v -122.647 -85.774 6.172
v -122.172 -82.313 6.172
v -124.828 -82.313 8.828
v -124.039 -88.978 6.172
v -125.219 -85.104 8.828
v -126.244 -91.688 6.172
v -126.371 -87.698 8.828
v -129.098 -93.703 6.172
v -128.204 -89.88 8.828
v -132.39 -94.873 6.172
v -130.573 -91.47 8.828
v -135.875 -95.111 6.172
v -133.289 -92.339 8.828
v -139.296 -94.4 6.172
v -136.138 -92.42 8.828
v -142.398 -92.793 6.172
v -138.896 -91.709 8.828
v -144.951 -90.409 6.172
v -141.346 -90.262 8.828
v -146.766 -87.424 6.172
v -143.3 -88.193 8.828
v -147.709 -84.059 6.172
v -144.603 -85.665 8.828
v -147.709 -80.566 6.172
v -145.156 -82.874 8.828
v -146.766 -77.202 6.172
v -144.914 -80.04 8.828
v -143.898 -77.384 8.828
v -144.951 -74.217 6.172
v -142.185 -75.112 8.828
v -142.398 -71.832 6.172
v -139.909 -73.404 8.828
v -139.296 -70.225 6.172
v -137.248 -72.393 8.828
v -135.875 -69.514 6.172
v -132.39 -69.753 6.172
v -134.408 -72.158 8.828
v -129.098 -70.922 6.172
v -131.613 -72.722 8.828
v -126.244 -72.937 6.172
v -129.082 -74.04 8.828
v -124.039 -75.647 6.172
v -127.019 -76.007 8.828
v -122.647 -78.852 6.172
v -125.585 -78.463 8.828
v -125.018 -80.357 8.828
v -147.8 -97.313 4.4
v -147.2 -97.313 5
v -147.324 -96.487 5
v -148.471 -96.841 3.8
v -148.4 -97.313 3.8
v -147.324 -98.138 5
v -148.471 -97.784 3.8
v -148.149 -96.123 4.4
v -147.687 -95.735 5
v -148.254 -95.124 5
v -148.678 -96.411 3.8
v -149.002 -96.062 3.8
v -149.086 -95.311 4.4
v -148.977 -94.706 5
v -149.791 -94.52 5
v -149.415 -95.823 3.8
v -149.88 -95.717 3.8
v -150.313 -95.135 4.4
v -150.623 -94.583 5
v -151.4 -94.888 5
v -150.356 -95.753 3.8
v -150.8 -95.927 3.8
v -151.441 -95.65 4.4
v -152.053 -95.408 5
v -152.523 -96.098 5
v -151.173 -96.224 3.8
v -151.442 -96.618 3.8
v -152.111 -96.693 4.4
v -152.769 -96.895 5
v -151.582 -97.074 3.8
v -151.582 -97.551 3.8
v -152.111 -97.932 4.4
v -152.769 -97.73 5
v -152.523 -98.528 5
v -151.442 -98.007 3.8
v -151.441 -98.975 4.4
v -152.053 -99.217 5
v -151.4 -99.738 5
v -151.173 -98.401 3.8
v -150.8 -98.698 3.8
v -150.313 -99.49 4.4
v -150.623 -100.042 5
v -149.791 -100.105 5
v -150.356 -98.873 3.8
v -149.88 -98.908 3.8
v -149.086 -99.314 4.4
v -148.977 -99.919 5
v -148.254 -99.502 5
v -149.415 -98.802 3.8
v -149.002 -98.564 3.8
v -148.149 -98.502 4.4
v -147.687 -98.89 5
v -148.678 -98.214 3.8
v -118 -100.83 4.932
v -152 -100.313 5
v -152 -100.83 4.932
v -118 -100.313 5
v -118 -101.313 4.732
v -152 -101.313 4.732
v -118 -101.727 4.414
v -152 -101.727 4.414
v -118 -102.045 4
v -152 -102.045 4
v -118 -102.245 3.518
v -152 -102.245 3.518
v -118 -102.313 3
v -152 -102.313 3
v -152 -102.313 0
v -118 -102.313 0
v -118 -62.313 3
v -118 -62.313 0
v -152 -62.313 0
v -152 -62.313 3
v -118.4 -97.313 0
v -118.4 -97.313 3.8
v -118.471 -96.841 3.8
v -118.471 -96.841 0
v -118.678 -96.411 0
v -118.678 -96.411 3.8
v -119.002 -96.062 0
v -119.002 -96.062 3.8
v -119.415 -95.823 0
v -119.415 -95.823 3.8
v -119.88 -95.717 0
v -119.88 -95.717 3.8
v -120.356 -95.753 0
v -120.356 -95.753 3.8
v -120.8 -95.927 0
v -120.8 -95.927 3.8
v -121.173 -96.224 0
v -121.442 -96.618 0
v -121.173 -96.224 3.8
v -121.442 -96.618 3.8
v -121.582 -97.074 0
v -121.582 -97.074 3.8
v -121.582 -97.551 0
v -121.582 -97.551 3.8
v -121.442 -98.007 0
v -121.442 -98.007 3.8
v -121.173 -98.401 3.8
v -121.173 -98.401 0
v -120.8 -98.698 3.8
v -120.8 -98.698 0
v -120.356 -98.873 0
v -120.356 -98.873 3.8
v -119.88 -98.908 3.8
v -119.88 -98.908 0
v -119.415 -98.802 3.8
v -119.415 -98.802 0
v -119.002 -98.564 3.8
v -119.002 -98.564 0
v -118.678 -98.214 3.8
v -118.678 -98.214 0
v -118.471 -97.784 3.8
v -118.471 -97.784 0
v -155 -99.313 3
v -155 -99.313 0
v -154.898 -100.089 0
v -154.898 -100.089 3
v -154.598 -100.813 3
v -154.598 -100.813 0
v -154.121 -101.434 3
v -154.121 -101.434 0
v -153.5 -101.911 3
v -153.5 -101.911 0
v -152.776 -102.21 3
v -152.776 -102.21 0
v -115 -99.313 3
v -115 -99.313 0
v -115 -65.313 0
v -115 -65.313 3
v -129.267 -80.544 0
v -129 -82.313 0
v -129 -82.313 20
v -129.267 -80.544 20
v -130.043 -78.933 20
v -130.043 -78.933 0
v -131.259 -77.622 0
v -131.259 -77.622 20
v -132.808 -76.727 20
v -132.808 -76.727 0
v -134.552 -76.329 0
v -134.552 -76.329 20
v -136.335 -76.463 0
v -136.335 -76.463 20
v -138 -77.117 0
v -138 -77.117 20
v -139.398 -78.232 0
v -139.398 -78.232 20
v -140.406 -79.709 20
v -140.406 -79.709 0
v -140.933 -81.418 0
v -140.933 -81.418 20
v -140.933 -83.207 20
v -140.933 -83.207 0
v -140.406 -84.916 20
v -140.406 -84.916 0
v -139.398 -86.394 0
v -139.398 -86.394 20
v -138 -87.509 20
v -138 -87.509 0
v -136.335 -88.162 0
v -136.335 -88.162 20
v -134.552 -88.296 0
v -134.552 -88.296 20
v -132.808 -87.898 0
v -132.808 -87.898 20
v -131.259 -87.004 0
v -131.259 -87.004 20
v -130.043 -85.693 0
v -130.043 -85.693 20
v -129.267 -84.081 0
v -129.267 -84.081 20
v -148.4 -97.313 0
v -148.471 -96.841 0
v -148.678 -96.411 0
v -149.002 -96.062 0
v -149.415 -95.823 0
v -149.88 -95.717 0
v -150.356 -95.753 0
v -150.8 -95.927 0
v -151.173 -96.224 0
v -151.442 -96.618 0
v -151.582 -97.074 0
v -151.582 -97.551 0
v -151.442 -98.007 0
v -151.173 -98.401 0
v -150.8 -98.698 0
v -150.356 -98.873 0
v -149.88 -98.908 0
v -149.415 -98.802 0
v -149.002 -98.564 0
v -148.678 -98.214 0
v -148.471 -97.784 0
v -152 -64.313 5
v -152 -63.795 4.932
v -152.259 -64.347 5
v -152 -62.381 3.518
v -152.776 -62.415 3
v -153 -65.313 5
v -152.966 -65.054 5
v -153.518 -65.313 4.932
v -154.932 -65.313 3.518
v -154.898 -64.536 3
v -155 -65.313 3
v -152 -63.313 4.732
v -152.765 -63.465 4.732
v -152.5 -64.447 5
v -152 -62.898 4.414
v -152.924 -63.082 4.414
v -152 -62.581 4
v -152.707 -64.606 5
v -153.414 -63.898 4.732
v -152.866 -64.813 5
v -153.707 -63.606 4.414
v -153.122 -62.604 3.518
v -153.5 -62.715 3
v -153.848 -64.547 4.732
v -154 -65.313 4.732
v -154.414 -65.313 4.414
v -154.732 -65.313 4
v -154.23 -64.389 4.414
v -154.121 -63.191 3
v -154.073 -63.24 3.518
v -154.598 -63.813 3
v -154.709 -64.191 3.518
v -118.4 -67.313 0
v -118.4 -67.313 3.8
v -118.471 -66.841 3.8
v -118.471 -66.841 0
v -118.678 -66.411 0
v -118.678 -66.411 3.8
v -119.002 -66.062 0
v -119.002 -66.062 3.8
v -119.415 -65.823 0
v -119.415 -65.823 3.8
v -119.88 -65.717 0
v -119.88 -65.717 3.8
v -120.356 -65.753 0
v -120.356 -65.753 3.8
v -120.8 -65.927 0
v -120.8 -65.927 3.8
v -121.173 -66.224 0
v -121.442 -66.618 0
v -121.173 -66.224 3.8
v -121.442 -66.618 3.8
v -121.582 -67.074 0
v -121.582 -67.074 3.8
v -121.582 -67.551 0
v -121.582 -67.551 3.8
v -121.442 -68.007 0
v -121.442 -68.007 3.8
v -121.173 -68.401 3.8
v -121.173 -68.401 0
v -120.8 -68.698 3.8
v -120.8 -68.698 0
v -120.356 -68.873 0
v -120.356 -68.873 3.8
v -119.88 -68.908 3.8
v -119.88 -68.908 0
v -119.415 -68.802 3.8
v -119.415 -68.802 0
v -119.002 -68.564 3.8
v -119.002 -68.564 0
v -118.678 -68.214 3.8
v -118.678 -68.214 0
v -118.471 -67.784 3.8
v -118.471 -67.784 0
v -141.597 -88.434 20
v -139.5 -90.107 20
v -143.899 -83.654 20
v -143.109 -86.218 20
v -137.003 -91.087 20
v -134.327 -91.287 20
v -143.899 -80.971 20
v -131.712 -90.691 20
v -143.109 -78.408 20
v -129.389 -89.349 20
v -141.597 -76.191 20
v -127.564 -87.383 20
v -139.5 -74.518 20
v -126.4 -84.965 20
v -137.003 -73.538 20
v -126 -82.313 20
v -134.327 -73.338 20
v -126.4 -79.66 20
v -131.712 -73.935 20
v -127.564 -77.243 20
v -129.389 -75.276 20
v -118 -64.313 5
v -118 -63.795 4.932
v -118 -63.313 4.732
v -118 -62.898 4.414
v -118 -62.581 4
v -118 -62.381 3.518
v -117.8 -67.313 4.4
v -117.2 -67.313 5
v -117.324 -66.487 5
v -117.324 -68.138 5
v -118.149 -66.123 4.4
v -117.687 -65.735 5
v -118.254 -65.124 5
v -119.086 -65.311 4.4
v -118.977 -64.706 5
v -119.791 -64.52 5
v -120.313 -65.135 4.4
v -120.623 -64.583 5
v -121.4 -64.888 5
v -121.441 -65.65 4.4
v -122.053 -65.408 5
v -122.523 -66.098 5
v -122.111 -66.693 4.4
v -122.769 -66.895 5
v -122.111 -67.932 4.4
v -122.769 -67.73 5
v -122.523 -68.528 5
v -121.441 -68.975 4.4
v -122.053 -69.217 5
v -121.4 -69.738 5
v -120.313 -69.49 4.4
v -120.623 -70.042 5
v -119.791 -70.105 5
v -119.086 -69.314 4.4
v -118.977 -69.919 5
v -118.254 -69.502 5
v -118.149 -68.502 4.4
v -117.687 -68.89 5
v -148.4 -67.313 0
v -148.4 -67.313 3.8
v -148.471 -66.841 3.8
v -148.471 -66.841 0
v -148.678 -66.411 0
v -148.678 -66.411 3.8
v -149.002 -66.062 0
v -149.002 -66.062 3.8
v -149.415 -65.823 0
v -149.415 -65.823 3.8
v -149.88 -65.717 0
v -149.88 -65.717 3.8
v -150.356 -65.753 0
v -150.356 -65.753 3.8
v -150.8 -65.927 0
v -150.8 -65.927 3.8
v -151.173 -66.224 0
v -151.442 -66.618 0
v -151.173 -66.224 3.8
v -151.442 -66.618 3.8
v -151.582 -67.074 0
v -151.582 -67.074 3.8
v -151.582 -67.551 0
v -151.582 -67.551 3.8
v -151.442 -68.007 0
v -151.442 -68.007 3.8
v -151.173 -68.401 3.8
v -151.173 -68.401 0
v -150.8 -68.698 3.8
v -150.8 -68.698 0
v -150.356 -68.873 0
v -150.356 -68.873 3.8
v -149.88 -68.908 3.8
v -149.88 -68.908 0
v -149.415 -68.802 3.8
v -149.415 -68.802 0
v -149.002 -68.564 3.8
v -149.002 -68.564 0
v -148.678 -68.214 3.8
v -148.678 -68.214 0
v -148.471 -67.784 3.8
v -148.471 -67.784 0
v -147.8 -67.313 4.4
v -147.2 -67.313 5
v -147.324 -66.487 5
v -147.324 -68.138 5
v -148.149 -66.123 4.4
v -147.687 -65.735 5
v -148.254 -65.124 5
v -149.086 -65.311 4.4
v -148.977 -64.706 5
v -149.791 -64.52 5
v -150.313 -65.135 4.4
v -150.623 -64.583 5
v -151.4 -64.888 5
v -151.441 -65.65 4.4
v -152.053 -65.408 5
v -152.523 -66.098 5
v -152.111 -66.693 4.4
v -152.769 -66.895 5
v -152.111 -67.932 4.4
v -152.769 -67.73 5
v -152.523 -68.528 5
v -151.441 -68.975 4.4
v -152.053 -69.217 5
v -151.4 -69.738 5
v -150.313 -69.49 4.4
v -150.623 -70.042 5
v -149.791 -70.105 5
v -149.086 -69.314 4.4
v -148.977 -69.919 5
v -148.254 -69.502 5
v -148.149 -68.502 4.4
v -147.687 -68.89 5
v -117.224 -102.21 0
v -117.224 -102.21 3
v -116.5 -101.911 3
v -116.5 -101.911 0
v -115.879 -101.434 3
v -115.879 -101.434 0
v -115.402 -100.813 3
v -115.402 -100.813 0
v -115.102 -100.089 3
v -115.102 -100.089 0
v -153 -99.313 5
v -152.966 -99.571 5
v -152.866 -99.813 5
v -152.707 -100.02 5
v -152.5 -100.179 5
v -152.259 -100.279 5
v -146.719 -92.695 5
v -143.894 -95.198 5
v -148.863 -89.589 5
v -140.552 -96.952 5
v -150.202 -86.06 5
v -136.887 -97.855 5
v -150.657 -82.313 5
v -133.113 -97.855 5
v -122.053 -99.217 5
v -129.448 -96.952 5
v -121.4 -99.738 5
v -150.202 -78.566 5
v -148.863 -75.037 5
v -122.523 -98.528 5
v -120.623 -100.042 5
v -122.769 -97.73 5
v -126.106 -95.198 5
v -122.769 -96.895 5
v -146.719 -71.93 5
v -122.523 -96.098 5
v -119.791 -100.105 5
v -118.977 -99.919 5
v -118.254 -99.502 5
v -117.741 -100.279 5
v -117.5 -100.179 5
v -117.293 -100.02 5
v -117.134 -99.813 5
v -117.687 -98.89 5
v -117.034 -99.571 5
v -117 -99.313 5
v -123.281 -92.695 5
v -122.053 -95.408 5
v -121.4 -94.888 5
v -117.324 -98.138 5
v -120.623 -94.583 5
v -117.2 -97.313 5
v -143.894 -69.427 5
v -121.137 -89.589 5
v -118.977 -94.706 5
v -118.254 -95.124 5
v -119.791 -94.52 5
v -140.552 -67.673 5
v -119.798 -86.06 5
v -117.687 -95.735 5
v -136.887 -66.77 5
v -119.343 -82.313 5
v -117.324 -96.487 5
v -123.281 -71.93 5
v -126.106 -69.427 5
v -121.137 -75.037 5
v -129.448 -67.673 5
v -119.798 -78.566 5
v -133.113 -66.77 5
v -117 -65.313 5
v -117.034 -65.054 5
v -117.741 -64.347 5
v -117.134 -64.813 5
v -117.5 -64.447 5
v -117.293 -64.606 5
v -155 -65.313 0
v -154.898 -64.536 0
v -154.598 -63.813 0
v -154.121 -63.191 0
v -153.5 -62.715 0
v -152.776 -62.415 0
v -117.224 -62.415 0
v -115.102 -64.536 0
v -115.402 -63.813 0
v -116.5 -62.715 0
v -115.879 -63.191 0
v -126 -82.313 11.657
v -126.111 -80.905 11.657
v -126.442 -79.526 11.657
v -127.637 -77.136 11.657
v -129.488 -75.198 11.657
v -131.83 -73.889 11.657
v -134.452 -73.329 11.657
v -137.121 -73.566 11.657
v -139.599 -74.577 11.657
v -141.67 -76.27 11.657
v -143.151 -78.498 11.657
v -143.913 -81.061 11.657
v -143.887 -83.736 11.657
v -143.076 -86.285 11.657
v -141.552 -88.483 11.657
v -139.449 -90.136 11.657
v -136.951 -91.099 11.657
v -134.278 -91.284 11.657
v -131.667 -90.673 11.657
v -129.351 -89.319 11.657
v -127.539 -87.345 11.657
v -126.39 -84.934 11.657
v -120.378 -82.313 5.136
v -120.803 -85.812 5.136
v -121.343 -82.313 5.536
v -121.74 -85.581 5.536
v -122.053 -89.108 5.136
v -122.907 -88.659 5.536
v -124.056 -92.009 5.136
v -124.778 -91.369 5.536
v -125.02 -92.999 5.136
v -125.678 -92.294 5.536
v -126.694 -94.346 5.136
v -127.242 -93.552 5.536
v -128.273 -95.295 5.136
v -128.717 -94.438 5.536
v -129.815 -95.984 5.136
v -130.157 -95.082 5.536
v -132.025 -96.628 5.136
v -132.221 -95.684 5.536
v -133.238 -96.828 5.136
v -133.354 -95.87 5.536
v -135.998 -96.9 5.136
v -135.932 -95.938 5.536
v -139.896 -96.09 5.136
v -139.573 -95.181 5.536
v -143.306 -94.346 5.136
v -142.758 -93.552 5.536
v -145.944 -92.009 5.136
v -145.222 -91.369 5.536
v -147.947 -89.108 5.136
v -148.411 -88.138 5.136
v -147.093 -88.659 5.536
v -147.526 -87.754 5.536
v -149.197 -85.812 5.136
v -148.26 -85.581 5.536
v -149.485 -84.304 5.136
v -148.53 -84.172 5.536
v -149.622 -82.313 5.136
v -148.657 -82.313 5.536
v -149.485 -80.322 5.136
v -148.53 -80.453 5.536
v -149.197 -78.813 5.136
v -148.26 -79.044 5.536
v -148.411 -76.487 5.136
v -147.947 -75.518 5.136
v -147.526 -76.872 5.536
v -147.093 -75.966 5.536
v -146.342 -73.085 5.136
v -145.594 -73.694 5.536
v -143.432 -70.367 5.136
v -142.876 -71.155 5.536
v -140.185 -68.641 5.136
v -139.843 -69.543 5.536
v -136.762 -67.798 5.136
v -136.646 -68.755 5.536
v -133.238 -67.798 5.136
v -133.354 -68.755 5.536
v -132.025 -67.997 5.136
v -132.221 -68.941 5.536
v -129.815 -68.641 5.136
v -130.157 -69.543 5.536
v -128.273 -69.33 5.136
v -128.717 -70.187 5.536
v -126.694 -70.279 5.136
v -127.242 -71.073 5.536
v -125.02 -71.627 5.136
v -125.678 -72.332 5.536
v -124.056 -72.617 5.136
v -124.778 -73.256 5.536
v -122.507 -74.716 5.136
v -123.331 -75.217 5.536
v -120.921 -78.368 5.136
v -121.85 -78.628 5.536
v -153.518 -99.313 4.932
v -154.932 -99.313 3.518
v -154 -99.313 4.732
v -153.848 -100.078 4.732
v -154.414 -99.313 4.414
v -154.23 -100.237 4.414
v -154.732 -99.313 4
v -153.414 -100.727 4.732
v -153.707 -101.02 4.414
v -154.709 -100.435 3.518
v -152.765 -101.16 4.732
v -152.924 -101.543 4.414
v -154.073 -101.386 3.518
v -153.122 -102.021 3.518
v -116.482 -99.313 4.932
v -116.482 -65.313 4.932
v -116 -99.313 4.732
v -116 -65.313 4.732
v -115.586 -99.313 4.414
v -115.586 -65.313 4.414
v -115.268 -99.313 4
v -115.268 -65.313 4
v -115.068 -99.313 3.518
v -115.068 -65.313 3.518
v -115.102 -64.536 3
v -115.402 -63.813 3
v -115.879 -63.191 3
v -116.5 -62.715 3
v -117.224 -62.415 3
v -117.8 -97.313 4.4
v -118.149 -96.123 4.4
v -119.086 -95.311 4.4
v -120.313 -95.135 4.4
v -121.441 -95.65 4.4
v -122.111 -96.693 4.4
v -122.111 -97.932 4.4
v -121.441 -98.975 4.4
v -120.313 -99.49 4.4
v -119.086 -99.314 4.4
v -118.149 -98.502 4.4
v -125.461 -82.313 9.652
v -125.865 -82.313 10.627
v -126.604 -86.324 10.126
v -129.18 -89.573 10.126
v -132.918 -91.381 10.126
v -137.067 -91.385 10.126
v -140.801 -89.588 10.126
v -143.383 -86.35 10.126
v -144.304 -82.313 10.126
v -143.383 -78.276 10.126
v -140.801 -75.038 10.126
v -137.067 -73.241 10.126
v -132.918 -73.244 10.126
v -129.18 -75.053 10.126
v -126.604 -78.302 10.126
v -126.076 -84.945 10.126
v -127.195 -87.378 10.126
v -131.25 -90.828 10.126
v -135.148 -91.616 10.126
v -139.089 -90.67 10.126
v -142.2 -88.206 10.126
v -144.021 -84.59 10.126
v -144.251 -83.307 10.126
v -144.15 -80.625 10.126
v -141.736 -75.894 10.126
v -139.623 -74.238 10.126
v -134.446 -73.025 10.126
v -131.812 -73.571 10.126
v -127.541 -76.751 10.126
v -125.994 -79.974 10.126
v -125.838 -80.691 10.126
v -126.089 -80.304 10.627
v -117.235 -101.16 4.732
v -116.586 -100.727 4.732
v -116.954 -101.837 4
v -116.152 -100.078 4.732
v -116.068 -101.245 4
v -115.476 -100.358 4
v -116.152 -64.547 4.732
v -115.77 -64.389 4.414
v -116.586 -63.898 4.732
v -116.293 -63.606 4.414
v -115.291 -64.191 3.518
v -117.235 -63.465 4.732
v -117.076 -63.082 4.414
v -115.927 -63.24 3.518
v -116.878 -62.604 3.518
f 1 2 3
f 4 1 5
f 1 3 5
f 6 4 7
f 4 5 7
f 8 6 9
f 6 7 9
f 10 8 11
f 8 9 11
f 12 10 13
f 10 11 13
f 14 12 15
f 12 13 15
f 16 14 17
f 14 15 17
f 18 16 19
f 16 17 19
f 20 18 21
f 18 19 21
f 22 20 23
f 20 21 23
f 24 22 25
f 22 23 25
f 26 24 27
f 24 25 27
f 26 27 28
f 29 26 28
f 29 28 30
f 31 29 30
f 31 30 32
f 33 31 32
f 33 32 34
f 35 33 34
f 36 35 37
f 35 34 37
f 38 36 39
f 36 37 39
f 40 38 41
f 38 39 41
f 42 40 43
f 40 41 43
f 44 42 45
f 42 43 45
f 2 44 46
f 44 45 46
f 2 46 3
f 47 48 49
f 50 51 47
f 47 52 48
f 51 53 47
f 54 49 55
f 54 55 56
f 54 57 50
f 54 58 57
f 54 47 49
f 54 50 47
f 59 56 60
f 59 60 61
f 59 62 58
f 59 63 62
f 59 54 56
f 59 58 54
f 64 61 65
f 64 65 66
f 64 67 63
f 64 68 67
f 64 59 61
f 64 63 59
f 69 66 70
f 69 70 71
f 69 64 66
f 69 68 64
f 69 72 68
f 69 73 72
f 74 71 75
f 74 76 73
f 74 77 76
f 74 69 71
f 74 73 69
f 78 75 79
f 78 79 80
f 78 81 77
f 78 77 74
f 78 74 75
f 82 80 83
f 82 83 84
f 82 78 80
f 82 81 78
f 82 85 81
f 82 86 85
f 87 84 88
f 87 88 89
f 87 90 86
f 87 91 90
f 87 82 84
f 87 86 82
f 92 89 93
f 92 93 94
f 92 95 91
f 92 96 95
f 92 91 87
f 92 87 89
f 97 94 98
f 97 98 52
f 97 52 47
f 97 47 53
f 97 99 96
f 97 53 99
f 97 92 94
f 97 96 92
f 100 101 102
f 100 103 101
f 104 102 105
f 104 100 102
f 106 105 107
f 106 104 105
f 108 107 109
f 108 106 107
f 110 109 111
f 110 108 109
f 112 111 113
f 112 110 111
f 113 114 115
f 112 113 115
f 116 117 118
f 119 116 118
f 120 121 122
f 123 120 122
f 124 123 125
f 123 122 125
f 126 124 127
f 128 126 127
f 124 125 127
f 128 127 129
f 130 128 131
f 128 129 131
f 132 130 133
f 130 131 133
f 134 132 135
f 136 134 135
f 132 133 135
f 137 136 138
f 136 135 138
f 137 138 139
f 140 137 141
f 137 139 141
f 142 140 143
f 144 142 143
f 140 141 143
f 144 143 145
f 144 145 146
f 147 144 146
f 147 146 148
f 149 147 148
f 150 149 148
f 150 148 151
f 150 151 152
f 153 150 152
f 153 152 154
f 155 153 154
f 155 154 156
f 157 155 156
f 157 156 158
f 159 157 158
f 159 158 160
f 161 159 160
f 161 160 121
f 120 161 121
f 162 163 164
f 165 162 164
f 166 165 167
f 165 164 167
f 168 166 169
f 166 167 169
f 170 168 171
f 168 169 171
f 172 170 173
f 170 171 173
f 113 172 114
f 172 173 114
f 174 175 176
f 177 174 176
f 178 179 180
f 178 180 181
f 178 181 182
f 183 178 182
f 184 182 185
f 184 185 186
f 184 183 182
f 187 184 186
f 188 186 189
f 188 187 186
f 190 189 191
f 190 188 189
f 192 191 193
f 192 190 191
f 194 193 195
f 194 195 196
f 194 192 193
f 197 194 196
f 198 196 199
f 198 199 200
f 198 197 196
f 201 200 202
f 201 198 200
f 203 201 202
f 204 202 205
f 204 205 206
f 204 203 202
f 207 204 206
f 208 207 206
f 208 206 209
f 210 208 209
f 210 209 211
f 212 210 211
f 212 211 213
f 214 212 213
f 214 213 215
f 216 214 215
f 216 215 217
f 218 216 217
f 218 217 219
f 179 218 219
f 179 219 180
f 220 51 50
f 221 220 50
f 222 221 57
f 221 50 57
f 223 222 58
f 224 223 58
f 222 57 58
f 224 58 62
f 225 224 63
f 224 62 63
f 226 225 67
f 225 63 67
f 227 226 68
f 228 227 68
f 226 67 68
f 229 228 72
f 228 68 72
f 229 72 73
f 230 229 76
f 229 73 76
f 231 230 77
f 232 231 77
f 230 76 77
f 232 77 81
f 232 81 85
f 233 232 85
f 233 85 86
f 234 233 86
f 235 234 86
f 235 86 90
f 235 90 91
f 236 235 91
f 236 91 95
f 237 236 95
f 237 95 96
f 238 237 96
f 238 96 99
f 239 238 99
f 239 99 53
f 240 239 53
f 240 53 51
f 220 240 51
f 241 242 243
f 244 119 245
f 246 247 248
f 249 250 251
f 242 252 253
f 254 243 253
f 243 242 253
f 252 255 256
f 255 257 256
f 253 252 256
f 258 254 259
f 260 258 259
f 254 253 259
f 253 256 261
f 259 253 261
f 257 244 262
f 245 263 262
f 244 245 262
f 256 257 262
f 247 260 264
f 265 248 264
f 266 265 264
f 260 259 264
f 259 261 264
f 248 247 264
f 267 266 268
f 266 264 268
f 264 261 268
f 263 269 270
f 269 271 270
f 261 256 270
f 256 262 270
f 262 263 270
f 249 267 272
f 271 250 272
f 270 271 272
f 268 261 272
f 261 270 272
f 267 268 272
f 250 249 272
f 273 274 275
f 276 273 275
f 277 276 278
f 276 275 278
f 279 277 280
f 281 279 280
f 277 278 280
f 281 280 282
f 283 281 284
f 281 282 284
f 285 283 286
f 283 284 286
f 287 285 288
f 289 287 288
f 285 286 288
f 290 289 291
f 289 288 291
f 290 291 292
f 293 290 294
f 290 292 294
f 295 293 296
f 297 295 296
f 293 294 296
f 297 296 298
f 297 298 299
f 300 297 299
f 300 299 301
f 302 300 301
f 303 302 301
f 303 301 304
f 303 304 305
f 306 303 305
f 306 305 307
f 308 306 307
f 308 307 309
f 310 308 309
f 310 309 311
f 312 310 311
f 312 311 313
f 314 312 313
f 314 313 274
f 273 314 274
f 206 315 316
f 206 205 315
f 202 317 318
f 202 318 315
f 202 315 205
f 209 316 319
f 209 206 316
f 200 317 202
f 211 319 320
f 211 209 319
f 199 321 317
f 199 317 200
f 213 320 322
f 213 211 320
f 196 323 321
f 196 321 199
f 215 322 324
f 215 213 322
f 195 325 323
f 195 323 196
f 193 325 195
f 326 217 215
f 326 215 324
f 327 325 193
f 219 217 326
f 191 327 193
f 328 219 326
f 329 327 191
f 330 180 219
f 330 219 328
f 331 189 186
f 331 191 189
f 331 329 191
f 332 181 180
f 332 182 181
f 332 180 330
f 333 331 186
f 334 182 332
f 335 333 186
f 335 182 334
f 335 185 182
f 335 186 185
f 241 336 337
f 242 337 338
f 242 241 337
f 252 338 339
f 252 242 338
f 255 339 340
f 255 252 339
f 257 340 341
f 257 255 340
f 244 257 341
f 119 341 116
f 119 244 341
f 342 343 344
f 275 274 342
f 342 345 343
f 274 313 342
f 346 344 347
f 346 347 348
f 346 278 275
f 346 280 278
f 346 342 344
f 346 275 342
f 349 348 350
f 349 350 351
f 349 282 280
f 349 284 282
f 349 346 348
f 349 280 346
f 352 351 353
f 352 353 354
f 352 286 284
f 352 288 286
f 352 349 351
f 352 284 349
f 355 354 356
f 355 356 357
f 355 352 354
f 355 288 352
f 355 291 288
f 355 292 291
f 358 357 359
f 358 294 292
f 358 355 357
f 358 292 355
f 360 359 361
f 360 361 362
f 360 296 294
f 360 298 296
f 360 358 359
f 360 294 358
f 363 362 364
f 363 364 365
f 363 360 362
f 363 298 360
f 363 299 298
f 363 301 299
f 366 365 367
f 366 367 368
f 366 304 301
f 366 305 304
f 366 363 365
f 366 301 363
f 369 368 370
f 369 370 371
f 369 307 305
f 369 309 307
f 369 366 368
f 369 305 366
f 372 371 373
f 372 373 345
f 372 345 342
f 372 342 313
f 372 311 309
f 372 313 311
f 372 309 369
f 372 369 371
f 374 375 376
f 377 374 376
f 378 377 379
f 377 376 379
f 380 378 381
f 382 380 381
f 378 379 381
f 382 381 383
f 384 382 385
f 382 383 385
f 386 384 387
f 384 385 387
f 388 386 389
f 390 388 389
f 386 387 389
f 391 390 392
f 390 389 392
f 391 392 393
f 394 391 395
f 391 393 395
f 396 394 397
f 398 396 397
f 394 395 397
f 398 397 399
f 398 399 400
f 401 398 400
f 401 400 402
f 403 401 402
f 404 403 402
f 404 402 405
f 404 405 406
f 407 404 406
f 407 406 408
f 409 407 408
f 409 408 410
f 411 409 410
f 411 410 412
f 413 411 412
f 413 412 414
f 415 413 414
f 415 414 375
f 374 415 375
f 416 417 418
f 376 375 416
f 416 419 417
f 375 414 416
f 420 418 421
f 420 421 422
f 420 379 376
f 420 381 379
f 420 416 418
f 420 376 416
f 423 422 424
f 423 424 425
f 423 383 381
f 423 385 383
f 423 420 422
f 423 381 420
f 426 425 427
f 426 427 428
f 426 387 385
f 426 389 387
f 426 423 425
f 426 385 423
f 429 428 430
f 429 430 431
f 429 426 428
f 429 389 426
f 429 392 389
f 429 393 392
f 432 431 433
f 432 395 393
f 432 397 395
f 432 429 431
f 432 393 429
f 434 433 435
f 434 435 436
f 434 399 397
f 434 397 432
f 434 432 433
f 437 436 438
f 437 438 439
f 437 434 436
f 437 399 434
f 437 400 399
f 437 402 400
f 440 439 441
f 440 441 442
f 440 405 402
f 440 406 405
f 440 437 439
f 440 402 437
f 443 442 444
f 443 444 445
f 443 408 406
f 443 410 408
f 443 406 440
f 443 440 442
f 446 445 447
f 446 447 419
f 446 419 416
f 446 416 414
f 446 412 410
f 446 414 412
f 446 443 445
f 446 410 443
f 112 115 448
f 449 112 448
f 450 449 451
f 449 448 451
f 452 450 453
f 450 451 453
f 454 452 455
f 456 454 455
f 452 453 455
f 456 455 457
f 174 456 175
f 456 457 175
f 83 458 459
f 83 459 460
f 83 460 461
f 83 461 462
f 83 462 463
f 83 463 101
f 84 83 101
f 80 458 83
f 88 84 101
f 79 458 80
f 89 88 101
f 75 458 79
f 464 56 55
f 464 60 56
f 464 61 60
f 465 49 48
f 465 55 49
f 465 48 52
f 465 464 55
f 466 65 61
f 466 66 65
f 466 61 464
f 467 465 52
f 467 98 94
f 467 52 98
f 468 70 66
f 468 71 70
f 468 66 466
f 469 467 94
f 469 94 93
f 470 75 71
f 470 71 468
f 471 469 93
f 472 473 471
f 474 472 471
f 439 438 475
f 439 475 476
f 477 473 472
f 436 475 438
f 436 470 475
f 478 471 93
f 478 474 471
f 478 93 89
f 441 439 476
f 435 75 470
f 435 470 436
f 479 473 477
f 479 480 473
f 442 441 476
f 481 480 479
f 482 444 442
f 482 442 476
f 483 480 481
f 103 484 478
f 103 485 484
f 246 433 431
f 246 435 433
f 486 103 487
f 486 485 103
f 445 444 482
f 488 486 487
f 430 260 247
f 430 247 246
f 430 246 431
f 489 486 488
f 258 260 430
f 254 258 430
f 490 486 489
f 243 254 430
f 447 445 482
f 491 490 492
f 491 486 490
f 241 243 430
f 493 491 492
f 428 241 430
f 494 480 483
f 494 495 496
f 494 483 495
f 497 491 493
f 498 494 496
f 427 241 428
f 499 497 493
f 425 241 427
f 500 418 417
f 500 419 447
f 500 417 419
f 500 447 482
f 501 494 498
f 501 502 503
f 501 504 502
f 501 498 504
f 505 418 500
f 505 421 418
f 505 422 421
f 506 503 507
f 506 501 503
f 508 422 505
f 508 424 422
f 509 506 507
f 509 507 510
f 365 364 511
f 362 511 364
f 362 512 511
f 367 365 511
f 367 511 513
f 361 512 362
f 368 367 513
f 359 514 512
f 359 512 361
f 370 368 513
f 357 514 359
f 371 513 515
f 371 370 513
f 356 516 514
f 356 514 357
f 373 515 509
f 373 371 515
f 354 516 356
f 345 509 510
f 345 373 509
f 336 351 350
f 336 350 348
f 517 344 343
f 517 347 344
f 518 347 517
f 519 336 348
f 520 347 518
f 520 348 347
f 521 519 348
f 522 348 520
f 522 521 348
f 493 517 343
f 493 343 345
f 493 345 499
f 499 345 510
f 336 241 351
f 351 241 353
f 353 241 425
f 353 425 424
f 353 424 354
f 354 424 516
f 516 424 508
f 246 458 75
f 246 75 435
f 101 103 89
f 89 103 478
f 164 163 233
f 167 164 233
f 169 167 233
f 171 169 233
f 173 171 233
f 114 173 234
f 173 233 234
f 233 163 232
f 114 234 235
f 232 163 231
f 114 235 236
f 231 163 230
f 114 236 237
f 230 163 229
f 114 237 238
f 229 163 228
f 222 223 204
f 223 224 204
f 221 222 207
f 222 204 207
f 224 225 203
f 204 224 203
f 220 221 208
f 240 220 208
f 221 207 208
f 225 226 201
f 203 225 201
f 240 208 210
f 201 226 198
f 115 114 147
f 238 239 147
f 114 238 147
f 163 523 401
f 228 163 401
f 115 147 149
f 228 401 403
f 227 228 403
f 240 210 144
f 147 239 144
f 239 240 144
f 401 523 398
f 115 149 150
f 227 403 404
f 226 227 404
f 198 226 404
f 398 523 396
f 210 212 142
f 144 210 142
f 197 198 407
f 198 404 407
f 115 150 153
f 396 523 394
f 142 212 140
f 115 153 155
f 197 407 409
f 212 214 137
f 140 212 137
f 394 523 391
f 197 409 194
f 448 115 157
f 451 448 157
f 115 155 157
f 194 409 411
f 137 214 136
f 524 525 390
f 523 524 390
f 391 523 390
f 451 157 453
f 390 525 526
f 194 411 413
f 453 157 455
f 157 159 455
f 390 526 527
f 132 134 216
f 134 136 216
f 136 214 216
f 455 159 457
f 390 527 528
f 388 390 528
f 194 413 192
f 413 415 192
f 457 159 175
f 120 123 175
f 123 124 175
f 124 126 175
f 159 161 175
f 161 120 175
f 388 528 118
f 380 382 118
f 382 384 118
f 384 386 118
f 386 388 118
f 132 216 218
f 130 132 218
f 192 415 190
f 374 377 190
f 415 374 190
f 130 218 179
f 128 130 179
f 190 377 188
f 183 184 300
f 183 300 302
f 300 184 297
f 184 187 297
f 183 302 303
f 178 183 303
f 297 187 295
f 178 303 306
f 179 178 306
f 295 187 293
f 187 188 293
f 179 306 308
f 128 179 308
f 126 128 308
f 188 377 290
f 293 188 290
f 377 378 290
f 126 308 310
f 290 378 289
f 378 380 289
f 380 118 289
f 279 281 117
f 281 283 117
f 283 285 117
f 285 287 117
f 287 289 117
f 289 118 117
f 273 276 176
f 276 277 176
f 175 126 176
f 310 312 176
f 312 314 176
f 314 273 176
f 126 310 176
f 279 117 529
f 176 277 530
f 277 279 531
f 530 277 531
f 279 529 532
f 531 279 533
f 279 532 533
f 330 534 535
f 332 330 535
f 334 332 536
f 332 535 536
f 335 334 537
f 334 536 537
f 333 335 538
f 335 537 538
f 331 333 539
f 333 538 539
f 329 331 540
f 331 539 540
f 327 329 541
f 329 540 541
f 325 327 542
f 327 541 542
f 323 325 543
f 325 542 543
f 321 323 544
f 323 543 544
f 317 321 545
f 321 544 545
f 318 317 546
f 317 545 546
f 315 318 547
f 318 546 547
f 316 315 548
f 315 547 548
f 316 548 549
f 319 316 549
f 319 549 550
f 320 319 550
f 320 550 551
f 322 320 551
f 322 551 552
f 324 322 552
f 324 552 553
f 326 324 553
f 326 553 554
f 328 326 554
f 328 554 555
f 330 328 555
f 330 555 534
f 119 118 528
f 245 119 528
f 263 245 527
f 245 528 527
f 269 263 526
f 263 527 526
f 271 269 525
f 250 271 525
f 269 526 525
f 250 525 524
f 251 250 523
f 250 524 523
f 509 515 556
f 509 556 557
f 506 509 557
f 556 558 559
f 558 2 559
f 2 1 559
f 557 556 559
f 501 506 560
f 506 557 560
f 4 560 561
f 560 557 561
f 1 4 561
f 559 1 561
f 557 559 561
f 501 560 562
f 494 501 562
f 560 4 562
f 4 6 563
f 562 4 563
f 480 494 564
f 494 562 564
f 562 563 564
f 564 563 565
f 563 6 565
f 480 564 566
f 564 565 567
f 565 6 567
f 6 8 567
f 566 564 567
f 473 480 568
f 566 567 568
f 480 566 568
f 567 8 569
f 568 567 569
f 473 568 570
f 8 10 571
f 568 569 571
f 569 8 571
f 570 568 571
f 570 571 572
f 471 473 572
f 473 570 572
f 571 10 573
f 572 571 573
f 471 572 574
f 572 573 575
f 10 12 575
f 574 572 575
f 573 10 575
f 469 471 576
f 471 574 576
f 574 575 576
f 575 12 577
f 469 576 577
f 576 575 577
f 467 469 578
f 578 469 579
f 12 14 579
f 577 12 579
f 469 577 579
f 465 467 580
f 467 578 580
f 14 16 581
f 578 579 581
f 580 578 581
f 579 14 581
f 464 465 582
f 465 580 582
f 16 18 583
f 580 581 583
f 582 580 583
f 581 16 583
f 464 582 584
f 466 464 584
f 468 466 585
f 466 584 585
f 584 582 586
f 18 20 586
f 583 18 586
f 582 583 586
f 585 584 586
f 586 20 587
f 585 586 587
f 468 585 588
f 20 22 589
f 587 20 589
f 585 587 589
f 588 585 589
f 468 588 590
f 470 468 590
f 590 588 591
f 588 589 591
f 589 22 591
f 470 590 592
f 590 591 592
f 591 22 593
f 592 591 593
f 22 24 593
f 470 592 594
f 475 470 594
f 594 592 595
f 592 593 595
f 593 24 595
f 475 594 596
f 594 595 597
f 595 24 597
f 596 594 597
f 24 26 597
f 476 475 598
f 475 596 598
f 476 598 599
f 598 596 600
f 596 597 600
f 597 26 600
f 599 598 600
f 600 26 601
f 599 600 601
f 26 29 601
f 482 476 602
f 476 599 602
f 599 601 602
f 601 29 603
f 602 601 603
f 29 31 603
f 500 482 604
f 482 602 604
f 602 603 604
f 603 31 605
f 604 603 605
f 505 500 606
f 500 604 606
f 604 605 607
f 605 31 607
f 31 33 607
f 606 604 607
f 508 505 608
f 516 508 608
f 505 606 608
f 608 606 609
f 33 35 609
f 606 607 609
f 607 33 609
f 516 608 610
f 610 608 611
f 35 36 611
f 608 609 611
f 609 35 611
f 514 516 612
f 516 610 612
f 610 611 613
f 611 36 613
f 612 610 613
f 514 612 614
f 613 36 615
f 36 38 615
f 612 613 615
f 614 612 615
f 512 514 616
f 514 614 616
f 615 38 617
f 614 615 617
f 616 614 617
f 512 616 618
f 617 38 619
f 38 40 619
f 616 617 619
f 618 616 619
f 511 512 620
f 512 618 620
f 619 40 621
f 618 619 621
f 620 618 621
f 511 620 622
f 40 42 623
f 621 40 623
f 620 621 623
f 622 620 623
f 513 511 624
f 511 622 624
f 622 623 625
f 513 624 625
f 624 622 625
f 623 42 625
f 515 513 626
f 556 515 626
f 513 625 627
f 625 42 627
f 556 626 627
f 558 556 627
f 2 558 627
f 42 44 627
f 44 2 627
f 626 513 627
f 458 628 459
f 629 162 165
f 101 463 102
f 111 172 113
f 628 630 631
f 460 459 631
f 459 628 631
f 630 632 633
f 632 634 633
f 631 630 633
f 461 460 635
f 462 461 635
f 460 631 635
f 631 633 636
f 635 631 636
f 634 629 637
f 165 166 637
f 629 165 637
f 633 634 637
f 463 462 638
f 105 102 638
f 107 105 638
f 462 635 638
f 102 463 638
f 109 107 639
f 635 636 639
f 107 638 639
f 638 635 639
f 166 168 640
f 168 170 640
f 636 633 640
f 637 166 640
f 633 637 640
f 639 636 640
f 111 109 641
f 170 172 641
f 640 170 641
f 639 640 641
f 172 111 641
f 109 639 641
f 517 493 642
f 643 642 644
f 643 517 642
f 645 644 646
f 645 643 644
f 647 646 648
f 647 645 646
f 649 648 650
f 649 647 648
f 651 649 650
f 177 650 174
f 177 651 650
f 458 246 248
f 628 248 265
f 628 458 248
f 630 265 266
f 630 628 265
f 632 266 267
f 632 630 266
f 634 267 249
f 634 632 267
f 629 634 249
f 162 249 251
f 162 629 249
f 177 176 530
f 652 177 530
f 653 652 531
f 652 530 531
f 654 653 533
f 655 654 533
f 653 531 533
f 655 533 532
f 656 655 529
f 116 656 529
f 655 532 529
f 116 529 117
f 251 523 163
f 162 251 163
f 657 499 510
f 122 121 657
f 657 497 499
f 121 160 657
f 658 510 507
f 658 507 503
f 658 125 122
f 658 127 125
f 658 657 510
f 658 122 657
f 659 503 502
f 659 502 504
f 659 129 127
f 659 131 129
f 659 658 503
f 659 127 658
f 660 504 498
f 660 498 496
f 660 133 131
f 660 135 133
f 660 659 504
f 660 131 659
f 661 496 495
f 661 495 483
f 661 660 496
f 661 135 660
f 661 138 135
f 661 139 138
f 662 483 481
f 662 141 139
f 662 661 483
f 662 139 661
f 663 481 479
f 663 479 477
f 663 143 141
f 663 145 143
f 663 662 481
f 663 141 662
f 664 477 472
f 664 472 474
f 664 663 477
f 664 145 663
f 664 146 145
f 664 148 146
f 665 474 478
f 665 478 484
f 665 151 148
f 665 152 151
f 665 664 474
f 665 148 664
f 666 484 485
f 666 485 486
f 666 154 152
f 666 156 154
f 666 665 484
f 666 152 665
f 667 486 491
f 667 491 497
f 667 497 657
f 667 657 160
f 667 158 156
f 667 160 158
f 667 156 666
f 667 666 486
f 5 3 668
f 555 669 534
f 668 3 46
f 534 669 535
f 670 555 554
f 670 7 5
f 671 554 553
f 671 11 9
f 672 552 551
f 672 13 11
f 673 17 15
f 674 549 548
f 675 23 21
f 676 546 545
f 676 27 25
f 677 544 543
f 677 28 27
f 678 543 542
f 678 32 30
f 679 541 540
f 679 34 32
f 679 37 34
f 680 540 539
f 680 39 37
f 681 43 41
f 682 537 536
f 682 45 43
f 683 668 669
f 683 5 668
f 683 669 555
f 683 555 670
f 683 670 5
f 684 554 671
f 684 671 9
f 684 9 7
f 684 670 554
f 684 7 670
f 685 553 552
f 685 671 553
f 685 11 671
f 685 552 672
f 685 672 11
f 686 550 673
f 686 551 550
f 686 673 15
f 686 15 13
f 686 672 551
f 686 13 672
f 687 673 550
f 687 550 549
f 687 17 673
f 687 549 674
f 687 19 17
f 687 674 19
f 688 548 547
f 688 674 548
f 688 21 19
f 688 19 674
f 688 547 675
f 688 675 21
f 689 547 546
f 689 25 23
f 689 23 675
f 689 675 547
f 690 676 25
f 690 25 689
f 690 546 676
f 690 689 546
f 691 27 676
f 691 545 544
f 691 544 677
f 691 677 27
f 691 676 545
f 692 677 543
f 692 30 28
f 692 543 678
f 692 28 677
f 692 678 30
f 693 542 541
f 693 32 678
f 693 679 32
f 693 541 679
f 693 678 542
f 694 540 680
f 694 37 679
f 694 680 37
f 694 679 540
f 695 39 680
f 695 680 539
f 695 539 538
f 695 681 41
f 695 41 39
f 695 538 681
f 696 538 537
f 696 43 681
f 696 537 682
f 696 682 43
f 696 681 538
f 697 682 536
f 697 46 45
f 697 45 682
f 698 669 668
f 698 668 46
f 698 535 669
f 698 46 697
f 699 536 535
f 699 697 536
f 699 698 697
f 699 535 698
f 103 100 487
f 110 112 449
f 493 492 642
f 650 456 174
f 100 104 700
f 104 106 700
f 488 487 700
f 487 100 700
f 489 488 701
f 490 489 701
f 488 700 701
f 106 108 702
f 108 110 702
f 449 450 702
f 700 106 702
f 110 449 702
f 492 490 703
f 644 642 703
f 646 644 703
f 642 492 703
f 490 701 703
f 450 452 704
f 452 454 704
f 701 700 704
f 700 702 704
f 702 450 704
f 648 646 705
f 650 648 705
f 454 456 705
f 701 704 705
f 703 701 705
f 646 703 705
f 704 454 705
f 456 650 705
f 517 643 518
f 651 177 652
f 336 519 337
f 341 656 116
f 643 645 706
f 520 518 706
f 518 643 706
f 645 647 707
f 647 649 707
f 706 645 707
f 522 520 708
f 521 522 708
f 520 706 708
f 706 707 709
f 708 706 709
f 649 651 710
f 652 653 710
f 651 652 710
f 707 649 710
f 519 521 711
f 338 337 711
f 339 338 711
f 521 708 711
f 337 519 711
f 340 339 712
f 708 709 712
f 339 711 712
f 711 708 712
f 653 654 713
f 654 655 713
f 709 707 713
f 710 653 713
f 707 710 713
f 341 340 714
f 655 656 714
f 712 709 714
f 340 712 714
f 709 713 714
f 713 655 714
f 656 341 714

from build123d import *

# Parameters (mm, degrees)
SKETCH2_R           = 9
SKETCH2_R_2         = 6
BOSS_EXTRUDE1_DEPTH = 20
SKETCH3_R           = 6
BOSS_EXTRUDE2_DEPTH = 5
FILLET1_R           = 2
CUT_EXTRUDE1_REACH  = 7
SKETCH4_R           = 1.6
CHAMFER1_SIZE       = 5
FILLET2_R           = 4
CHAMFER2_SIZE       = 1.2


with BuildPart() as part:
    # Sketch2 → Boss-Extrude1 (new body)
    with BuildSketch(Plane.XY):
        with Locations((-135, -82.312657819)):
            Circle(SKETCH2_R)
        with Locations((-135, -82.312657819)):
            Circle(SKETCH2_R_2, mode=Mode.SUBTRACT)
    extrude(amount=BOSS_EXTRUDE1_DEPTH)

    # Sketch3 → Boss-Extrude2 (add)
    with BuildSketch(Plane(origin=(0, 0, 0), x_dir=(-1, 0, 0), z_dir=(0, 0, -1))):
        with BuildLine():
            Line((152, -102.312657819), (118, -102.312657819))
            ThreePointArc((118, -102.312657819), (115.878679656, -101.433978162), (115, -99.312657819))
            Line((115, -99.312657819), (115, -65.312657819))
            ThreePointArc((115, -65.312657819), (115.878679656, -63.191337475), (118, -62.312657819))
            Line((118, -62.312657819), (152, -62.312657819))
            ThreePointArc((152, -62.312657819), (154.121320344, -63.191337475), (155, -65.312657819))
            Line((155, -65.312657819), (155, -99.312657819))
            ThreePointArc((155, -99.312657819), (154.121320344, -101.433978162), (152, -102.312657819))
        make_face()
        with Locations((135, -82.312657819)):
            Circle(SKETCH3_R, mode=Mode.SUBTRACT)
    extrude(amount=-BOSS_EXTRUDE2_DEPTH)

    # Fillet1
    fillet1_edges = [part.edges().sort_by_distance(p)[0] for p in [
        (-115.878679656, -101.433978162, 5),
        (-115, -82.312657819, 5),
        (-115.878679656, -63.191337475, 5),
        (-135, -62.312657819, 5),
        (-154.121320344, -63.191337475, 5),
        (-155, -82.312657819, 5),
        (-154.121320344, -101.433978162, 5),
        (-135, -102.312657819, 5),
    ]]
    fillet(fillet1_edges, radius=FILLET1_R)

    # Sketch4 → Cut-Extrude1 (cut, up to next)
    with BuildSketch(Plane.XY.offset(5), mode=Mode.PRIVATE) as cut_extrude1_sk1:
        with Locations((-150, -67.312657819)):
            Circle(SKETCH4_R)
    cut_extrude1_tool1 = extrude(cut_extrude1_sk1.sketch, amount=-CUT_EXTRUDE1_REACH, mode=Mode.PRIVATE) & part.part
    add(cut_extrude1_tool1.solids().sort_by_distance((-150, -67.312658, 5))[0], mode=Mode.SUBTRACT)
    # Sketch4 → Cut-Extrude1 (cut, up to next)
    with BuildSketch(Plane.XY.offset(5), mode=Mode.PRIVATE) as cut_extrude1_sk2:
        with Locations((-120, -67.312657819)):
            Circle(SKETCH4_R)
    cut_extrude1_tool2 = extrude(cut_extrude1_sk2.sketch, amount=-CUT_EXTRUDE1_REACH, mode=Mode.PRIVATE) & part.part
    add(cut_extrude1_tool2.solids().sort_by_distance((-120, -67.312658, 5))[0], mode=Mode.SUBTRACT)
    # Sketch4 → Cut-Extrude1 (cut, up to next)
    with BuildSketch(Plane.XY.offset(5), mode=Mode.PRIVATE) as cut_extrude1_sk3:
        with Locations((-120, -97.312657819)):
            Circle(SKETCH4_R)
    cut_extrude1_tool3 = extrude(cut_extrude1_sk3.sketch, amount=-CUT_EXTRUDE1_REACH, mode=Mode.PRIVATE) & part.part
    add(cut_extrude1_tool3.solids().sort_by_distance((-120, -97.312658, 5))[0], mode=Mode.SUBTRACT)
    # Sketch4 → Cut-Extrude1 (cut, up to next)
    with BuildSketch(Plane.XY.offset(5), mode=Mode.PRIVATE) as cut_extrude1_sk4:
        with Locations((-150, -97.312657819)):
            Circle(SKETCH4_R)
    cut_extrude1_tool4 = extrude(cut_extrude1_sk4.sketch, amount=-CUT_EXTRUDE1_REACH, mode=Mode.PRIVATE) & part.part
    add(cut_extrude1_tool4.solids().sort_by_distance((-150, -97.312658, 5))[0], mode=Mode.SUBTRACT)

    # Chamfer1
    chamfer1_edges = [part.edges().sort_by_distance(p)[0] for p in [
        (-144, -82.312657819, 5),
    ]]
    chamfer(chamfer1_edges, length=CHAMFER1_SIZE)

    # Fillet2
    fillet2_edges = [part.edges().sort_by_distance(p)[0] for p in [
        (-144, -82.312657819, 10),
        (-149, -82.312657819, 5),
    ]]
    fillet(fillet2_edges, radius=FILLET2_R)

    # Chamfer2
    chamfer2_edges = [part.edges().sort_by_distance(p)[0] for p in [
        (-151.6, -97.312657819, 5),
        (-121.6, -97.312657819, 5),
        (-121.6, -67.312657819, 5),
        (-151.6, -67.312657819, 5),
    ]]
    chamfer(chamfer2_edges, length=CHAMFER2_SIZE)


solid = part.part
